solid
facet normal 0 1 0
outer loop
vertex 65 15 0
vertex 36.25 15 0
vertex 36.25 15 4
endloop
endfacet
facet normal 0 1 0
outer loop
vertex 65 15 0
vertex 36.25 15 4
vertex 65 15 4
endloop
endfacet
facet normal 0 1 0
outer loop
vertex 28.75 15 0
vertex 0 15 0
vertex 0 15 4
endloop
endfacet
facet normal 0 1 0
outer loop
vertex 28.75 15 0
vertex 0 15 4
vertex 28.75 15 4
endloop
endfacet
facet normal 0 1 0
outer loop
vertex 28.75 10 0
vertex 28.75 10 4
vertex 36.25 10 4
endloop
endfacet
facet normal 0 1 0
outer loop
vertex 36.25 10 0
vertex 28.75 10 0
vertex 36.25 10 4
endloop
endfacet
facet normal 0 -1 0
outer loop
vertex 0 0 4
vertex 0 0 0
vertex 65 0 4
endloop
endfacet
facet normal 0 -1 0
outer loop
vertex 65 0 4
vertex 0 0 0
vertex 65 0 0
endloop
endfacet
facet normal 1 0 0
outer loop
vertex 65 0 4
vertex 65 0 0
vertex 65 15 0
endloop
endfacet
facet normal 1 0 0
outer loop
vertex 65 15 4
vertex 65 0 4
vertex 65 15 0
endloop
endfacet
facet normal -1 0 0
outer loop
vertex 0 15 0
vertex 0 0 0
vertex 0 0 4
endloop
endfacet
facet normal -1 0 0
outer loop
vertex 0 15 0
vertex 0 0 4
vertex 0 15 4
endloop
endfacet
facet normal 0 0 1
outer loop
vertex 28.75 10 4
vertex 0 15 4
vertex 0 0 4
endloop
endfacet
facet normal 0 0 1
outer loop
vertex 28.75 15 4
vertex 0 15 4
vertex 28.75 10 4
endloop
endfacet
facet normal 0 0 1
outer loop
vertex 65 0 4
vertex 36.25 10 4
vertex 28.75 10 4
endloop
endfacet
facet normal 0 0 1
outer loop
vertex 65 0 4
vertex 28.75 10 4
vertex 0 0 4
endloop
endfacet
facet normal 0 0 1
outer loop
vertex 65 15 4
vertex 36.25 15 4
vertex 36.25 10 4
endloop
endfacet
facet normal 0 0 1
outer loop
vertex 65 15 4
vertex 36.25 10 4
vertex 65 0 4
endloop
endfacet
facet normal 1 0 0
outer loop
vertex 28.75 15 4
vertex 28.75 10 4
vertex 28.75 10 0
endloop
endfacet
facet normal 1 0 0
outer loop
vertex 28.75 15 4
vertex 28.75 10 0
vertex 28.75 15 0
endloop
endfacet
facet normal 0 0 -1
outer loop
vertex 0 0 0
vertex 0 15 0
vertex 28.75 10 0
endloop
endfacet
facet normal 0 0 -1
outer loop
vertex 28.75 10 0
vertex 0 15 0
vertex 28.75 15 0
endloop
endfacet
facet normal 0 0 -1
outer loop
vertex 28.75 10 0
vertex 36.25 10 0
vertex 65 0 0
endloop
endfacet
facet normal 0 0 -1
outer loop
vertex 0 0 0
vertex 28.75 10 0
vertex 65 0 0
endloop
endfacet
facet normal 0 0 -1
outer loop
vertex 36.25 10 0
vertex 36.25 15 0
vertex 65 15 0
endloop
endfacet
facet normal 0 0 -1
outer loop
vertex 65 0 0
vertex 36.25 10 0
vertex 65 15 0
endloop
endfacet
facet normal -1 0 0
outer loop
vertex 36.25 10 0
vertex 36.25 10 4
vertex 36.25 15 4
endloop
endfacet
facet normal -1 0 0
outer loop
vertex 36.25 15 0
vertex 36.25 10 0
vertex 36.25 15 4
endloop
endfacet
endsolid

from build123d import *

# Parameters (mm, degrees)
SKIZZE1_W                       = 65
SKIZZE1_H                       = 15
AUFSATZ_LINEAR_AUSTRAGEN1_DEPTH = 4
SCHNITT_LINEAR_AUSTRAGEN1_REACH = 6
SKIZZE2_W                       = 7.5
SKIZZE2_H                       = 5


with BuildPart() as part:
    # Skizze1 → Aufsatz-Linear austragen1 (new body)
    with BuildSketch(Plane.XY):
        with Locations((32.5, 7.5)):
            Rectangle(SKIZZE1_W, SKIZZE1_H)
    extrude(amount=AUFSATZ_LINEAR_AUSTRAGEN1_DEPTH)

    # Skizze2 → Schnitt-Linear austragen1 (cut, up to next)
    with BuildSketch(Plane.XY.offset(4), mode=Mode.PRIVATE) as schnitt_linear_austragen1_sk1:
        with Locations((32.5, 12.5)):
            Rectangle(SKIZZE2_W, SKIZZE2_H)
    schnitt_linear_austragen1_tool1 = extrude(schnitt_linear_austragen1_sk1.sketch, amount=-SCHNITT_LINEAR_AUSTRAGEN1_REACH, mode=Mode.PRIVATE) & part.part
    add(schnitt_linear_austragen1_tool1.solids().sort_by_distance((32.5, 12.5, 4))[0], mode=Mode.SUBTRACT)


solid = part.part
